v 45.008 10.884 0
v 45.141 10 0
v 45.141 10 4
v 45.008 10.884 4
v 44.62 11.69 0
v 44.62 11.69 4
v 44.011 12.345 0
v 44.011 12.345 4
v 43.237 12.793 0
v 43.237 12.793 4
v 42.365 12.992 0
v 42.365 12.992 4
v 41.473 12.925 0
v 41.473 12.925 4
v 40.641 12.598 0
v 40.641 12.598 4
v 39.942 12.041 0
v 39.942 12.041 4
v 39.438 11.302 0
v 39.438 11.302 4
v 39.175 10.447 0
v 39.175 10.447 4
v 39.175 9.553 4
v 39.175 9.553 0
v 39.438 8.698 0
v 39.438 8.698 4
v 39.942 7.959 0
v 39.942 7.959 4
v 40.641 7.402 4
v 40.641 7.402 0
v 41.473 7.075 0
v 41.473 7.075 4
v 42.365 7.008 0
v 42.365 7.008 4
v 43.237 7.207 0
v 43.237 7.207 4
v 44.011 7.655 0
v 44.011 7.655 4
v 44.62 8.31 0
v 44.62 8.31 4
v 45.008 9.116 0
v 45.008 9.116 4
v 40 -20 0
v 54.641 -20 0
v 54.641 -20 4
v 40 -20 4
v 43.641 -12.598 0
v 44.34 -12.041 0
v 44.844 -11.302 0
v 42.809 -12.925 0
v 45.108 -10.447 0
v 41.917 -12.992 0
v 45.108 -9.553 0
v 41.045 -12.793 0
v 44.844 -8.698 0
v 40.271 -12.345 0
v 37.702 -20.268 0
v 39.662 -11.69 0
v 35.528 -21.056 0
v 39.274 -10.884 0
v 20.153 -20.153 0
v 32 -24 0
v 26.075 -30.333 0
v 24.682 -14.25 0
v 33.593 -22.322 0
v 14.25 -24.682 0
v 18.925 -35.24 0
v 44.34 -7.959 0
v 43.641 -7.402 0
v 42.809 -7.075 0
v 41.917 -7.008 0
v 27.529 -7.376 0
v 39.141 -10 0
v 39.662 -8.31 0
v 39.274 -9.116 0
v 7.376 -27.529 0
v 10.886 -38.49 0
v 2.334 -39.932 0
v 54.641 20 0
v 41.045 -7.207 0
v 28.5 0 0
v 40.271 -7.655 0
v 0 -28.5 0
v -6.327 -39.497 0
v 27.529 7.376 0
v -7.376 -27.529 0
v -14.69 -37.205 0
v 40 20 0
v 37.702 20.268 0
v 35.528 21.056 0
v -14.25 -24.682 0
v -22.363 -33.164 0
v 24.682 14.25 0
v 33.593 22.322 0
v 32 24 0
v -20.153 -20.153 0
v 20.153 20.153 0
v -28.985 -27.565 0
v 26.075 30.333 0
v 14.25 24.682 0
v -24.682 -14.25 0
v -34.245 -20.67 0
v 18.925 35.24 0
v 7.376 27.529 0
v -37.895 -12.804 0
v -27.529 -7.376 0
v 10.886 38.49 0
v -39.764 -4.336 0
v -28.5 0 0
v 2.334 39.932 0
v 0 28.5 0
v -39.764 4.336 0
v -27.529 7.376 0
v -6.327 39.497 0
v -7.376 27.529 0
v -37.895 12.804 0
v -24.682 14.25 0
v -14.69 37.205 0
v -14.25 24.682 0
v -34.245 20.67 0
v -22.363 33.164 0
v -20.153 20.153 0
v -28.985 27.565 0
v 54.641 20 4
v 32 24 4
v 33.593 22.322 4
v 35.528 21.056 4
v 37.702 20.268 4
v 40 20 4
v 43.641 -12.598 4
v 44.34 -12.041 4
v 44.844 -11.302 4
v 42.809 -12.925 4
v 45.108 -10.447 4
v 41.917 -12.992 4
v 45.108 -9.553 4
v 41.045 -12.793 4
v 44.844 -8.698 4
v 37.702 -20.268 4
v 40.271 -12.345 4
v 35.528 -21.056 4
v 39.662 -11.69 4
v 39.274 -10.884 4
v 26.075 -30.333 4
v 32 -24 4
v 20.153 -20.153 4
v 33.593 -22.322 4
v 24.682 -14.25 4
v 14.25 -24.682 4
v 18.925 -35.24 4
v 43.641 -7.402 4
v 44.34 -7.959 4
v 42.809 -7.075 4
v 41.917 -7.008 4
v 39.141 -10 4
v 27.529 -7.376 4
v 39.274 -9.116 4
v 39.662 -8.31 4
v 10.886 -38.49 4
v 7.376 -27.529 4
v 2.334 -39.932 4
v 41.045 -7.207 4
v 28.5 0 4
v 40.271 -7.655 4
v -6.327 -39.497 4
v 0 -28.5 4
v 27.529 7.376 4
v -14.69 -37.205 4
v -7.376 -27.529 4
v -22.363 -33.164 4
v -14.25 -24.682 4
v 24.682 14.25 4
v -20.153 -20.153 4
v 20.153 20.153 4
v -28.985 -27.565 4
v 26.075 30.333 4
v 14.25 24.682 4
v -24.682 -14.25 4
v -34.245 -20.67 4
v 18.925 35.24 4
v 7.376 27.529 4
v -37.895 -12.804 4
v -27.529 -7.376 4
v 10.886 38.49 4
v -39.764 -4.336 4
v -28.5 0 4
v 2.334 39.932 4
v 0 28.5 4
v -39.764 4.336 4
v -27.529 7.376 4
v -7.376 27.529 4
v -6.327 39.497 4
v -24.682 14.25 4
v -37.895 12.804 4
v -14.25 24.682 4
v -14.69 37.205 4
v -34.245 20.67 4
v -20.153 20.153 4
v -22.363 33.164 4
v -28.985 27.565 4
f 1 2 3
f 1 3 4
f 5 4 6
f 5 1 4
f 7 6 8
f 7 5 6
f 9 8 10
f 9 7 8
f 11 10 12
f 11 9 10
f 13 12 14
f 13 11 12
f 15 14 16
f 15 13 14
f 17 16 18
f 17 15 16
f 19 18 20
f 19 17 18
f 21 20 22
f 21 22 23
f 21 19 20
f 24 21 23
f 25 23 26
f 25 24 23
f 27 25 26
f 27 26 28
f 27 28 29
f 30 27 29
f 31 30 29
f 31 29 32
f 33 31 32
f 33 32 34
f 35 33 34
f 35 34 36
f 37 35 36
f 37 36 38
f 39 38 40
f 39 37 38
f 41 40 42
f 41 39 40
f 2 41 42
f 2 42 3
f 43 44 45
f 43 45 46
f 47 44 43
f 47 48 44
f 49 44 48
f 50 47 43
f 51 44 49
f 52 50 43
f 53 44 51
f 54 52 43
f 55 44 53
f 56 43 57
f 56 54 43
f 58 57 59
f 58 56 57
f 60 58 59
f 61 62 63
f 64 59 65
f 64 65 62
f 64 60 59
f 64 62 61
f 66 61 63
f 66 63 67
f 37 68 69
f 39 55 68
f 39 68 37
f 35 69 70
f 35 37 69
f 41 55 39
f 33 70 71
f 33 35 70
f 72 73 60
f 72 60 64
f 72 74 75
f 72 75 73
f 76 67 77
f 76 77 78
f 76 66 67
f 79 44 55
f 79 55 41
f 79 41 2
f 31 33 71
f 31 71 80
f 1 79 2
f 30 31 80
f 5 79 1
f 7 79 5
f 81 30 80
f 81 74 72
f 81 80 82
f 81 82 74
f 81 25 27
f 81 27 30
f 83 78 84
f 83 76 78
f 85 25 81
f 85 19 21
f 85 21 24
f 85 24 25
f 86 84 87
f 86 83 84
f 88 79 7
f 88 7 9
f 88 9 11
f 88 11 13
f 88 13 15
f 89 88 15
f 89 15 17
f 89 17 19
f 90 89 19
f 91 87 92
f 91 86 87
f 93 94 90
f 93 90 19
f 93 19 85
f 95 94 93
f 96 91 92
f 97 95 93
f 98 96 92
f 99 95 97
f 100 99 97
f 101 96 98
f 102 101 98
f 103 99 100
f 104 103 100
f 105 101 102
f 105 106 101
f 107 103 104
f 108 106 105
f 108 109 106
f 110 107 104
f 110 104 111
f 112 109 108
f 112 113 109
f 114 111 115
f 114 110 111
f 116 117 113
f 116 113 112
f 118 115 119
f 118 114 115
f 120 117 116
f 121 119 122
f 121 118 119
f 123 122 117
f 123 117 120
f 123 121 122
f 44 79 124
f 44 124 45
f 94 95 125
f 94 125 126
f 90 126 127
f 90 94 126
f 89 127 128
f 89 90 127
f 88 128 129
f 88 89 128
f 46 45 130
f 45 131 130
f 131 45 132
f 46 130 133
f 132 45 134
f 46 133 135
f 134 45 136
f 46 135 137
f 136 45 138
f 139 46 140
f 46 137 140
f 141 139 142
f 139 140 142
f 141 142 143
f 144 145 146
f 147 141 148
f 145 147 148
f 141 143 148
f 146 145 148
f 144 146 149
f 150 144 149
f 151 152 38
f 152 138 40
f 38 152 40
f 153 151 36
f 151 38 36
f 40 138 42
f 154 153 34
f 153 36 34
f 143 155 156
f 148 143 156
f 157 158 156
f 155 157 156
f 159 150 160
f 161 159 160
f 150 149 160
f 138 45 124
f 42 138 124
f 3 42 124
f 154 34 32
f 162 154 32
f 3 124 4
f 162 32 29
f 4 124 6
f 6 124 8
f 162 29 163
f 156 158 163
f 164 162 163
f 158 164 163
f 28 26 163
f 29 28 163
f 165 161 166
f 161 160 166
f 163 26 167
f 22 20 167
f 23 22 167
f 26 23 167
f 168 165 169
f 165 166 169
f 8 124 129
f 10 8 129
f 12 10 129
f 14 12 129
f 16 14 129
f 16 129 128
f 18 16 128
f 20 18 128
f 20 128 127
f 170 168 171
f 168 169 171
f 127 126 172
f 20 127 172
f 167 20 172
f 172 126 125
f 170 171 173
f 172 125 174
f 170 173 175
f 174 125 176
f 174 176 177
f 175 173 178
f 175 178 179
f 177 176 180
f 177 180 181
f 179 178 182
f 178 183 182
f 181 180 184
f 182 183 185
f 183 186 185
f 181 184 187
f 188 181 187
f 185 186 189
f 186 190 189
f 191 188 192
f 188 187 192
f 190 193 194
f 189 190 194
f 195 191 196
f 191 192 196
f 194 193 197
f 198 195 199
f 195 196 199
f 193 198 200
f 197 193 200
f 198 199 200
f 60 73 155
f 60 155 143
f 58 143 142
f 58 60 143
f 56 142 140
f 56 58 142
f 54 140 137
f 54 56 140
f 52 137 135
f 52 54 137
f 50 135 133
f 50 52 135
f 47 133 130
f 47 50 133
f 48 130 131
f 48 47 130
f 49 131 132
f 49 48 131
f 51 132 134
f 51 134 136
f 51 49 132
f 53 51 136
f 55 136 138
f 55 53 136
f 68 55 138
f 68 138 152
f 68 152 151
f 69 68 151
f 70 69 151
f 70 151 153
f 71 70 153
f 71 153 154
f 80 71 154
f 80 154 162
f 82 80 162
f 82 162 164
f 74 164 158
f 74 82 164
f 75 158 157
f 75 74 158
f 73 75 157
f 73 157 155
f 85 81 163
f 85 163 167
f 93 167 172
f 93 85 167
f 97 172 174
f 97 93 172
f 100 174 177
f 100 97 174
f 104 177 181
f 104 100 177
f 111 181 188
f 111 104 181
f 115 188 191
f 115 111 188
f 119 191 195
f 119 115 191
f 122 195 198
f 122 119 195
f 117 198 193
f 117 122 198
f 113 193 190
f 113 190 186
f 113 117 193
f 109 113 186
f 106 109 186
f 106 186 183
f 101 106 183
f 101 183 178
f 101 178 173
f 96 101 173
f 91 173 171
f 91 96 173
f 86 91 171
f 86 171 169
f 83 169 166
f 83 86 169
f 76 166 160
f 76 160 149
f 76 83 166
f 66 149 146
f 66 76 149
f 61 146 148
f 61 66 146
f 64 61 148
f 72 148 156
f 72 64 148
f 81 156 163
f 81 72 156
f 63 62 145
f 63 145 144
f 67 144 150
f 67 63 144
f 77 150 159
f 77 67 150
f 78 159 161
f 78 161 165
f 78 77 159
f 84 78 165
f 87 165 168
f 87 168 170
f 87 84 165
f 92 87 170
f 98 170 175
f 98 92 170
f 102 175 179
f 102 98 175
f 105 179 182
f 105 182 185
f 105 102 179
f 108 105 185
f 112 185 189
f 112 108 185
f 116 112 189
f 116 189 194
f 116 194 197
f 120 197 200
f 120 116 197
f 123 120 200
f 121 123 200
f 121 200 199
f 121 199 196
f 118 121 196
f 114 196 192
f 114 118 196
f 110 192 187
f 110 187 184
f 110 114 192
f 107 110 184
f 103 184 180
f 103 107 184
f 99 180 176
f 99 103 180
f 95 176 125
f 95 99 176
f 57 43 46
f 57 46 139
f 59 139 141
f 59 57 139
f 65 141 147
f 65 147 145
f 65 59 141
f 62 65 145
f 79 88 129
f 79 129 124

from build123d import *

# Parameters (mm, degrees)
ESQUISSE2_R        = 28.5
ESQUISSE2_R_2      = 3
BOSS_EXTRU_1_DEPTH = 4


with BuildPart() as part:
    # Esquisse2 → Boss.-Extru.1 (new body)
    with BuildSketch(Plane.XY):
        with BuildLine():
            Line((40, 20), (54.641016151, 20))
            Line((54.641016151, 20), (54.641016151, -20))
            Line((54.641016151, -20), (40, -20))
            ThreePointArc((40, -20), (35.527864045, -21.05572809), (32, -24))
            ThreePointArc((32, -24), (-40, 0), (32, 24))
            ThreePointArc((32, 24), (35.527864045, 21.05572809), (40, 20))
        make_face()
        Circle(ESQUISSE2_R, mode=Mode.SUBTRACT)
        with Locations((42.141016151, 10)):
            Circle(ESQUISSE2_R_2, mode=Mode.SUBTRACT)
        with Locations(Location((42.141016151, -10, 0), (0, 0, 180))):
            Circle(ESQUISSE2_R_2, mode=Mode.SUBTRACT)
    extrude(amount=BOSS_EXTRU_1_DEPTH)


solid = part.part
